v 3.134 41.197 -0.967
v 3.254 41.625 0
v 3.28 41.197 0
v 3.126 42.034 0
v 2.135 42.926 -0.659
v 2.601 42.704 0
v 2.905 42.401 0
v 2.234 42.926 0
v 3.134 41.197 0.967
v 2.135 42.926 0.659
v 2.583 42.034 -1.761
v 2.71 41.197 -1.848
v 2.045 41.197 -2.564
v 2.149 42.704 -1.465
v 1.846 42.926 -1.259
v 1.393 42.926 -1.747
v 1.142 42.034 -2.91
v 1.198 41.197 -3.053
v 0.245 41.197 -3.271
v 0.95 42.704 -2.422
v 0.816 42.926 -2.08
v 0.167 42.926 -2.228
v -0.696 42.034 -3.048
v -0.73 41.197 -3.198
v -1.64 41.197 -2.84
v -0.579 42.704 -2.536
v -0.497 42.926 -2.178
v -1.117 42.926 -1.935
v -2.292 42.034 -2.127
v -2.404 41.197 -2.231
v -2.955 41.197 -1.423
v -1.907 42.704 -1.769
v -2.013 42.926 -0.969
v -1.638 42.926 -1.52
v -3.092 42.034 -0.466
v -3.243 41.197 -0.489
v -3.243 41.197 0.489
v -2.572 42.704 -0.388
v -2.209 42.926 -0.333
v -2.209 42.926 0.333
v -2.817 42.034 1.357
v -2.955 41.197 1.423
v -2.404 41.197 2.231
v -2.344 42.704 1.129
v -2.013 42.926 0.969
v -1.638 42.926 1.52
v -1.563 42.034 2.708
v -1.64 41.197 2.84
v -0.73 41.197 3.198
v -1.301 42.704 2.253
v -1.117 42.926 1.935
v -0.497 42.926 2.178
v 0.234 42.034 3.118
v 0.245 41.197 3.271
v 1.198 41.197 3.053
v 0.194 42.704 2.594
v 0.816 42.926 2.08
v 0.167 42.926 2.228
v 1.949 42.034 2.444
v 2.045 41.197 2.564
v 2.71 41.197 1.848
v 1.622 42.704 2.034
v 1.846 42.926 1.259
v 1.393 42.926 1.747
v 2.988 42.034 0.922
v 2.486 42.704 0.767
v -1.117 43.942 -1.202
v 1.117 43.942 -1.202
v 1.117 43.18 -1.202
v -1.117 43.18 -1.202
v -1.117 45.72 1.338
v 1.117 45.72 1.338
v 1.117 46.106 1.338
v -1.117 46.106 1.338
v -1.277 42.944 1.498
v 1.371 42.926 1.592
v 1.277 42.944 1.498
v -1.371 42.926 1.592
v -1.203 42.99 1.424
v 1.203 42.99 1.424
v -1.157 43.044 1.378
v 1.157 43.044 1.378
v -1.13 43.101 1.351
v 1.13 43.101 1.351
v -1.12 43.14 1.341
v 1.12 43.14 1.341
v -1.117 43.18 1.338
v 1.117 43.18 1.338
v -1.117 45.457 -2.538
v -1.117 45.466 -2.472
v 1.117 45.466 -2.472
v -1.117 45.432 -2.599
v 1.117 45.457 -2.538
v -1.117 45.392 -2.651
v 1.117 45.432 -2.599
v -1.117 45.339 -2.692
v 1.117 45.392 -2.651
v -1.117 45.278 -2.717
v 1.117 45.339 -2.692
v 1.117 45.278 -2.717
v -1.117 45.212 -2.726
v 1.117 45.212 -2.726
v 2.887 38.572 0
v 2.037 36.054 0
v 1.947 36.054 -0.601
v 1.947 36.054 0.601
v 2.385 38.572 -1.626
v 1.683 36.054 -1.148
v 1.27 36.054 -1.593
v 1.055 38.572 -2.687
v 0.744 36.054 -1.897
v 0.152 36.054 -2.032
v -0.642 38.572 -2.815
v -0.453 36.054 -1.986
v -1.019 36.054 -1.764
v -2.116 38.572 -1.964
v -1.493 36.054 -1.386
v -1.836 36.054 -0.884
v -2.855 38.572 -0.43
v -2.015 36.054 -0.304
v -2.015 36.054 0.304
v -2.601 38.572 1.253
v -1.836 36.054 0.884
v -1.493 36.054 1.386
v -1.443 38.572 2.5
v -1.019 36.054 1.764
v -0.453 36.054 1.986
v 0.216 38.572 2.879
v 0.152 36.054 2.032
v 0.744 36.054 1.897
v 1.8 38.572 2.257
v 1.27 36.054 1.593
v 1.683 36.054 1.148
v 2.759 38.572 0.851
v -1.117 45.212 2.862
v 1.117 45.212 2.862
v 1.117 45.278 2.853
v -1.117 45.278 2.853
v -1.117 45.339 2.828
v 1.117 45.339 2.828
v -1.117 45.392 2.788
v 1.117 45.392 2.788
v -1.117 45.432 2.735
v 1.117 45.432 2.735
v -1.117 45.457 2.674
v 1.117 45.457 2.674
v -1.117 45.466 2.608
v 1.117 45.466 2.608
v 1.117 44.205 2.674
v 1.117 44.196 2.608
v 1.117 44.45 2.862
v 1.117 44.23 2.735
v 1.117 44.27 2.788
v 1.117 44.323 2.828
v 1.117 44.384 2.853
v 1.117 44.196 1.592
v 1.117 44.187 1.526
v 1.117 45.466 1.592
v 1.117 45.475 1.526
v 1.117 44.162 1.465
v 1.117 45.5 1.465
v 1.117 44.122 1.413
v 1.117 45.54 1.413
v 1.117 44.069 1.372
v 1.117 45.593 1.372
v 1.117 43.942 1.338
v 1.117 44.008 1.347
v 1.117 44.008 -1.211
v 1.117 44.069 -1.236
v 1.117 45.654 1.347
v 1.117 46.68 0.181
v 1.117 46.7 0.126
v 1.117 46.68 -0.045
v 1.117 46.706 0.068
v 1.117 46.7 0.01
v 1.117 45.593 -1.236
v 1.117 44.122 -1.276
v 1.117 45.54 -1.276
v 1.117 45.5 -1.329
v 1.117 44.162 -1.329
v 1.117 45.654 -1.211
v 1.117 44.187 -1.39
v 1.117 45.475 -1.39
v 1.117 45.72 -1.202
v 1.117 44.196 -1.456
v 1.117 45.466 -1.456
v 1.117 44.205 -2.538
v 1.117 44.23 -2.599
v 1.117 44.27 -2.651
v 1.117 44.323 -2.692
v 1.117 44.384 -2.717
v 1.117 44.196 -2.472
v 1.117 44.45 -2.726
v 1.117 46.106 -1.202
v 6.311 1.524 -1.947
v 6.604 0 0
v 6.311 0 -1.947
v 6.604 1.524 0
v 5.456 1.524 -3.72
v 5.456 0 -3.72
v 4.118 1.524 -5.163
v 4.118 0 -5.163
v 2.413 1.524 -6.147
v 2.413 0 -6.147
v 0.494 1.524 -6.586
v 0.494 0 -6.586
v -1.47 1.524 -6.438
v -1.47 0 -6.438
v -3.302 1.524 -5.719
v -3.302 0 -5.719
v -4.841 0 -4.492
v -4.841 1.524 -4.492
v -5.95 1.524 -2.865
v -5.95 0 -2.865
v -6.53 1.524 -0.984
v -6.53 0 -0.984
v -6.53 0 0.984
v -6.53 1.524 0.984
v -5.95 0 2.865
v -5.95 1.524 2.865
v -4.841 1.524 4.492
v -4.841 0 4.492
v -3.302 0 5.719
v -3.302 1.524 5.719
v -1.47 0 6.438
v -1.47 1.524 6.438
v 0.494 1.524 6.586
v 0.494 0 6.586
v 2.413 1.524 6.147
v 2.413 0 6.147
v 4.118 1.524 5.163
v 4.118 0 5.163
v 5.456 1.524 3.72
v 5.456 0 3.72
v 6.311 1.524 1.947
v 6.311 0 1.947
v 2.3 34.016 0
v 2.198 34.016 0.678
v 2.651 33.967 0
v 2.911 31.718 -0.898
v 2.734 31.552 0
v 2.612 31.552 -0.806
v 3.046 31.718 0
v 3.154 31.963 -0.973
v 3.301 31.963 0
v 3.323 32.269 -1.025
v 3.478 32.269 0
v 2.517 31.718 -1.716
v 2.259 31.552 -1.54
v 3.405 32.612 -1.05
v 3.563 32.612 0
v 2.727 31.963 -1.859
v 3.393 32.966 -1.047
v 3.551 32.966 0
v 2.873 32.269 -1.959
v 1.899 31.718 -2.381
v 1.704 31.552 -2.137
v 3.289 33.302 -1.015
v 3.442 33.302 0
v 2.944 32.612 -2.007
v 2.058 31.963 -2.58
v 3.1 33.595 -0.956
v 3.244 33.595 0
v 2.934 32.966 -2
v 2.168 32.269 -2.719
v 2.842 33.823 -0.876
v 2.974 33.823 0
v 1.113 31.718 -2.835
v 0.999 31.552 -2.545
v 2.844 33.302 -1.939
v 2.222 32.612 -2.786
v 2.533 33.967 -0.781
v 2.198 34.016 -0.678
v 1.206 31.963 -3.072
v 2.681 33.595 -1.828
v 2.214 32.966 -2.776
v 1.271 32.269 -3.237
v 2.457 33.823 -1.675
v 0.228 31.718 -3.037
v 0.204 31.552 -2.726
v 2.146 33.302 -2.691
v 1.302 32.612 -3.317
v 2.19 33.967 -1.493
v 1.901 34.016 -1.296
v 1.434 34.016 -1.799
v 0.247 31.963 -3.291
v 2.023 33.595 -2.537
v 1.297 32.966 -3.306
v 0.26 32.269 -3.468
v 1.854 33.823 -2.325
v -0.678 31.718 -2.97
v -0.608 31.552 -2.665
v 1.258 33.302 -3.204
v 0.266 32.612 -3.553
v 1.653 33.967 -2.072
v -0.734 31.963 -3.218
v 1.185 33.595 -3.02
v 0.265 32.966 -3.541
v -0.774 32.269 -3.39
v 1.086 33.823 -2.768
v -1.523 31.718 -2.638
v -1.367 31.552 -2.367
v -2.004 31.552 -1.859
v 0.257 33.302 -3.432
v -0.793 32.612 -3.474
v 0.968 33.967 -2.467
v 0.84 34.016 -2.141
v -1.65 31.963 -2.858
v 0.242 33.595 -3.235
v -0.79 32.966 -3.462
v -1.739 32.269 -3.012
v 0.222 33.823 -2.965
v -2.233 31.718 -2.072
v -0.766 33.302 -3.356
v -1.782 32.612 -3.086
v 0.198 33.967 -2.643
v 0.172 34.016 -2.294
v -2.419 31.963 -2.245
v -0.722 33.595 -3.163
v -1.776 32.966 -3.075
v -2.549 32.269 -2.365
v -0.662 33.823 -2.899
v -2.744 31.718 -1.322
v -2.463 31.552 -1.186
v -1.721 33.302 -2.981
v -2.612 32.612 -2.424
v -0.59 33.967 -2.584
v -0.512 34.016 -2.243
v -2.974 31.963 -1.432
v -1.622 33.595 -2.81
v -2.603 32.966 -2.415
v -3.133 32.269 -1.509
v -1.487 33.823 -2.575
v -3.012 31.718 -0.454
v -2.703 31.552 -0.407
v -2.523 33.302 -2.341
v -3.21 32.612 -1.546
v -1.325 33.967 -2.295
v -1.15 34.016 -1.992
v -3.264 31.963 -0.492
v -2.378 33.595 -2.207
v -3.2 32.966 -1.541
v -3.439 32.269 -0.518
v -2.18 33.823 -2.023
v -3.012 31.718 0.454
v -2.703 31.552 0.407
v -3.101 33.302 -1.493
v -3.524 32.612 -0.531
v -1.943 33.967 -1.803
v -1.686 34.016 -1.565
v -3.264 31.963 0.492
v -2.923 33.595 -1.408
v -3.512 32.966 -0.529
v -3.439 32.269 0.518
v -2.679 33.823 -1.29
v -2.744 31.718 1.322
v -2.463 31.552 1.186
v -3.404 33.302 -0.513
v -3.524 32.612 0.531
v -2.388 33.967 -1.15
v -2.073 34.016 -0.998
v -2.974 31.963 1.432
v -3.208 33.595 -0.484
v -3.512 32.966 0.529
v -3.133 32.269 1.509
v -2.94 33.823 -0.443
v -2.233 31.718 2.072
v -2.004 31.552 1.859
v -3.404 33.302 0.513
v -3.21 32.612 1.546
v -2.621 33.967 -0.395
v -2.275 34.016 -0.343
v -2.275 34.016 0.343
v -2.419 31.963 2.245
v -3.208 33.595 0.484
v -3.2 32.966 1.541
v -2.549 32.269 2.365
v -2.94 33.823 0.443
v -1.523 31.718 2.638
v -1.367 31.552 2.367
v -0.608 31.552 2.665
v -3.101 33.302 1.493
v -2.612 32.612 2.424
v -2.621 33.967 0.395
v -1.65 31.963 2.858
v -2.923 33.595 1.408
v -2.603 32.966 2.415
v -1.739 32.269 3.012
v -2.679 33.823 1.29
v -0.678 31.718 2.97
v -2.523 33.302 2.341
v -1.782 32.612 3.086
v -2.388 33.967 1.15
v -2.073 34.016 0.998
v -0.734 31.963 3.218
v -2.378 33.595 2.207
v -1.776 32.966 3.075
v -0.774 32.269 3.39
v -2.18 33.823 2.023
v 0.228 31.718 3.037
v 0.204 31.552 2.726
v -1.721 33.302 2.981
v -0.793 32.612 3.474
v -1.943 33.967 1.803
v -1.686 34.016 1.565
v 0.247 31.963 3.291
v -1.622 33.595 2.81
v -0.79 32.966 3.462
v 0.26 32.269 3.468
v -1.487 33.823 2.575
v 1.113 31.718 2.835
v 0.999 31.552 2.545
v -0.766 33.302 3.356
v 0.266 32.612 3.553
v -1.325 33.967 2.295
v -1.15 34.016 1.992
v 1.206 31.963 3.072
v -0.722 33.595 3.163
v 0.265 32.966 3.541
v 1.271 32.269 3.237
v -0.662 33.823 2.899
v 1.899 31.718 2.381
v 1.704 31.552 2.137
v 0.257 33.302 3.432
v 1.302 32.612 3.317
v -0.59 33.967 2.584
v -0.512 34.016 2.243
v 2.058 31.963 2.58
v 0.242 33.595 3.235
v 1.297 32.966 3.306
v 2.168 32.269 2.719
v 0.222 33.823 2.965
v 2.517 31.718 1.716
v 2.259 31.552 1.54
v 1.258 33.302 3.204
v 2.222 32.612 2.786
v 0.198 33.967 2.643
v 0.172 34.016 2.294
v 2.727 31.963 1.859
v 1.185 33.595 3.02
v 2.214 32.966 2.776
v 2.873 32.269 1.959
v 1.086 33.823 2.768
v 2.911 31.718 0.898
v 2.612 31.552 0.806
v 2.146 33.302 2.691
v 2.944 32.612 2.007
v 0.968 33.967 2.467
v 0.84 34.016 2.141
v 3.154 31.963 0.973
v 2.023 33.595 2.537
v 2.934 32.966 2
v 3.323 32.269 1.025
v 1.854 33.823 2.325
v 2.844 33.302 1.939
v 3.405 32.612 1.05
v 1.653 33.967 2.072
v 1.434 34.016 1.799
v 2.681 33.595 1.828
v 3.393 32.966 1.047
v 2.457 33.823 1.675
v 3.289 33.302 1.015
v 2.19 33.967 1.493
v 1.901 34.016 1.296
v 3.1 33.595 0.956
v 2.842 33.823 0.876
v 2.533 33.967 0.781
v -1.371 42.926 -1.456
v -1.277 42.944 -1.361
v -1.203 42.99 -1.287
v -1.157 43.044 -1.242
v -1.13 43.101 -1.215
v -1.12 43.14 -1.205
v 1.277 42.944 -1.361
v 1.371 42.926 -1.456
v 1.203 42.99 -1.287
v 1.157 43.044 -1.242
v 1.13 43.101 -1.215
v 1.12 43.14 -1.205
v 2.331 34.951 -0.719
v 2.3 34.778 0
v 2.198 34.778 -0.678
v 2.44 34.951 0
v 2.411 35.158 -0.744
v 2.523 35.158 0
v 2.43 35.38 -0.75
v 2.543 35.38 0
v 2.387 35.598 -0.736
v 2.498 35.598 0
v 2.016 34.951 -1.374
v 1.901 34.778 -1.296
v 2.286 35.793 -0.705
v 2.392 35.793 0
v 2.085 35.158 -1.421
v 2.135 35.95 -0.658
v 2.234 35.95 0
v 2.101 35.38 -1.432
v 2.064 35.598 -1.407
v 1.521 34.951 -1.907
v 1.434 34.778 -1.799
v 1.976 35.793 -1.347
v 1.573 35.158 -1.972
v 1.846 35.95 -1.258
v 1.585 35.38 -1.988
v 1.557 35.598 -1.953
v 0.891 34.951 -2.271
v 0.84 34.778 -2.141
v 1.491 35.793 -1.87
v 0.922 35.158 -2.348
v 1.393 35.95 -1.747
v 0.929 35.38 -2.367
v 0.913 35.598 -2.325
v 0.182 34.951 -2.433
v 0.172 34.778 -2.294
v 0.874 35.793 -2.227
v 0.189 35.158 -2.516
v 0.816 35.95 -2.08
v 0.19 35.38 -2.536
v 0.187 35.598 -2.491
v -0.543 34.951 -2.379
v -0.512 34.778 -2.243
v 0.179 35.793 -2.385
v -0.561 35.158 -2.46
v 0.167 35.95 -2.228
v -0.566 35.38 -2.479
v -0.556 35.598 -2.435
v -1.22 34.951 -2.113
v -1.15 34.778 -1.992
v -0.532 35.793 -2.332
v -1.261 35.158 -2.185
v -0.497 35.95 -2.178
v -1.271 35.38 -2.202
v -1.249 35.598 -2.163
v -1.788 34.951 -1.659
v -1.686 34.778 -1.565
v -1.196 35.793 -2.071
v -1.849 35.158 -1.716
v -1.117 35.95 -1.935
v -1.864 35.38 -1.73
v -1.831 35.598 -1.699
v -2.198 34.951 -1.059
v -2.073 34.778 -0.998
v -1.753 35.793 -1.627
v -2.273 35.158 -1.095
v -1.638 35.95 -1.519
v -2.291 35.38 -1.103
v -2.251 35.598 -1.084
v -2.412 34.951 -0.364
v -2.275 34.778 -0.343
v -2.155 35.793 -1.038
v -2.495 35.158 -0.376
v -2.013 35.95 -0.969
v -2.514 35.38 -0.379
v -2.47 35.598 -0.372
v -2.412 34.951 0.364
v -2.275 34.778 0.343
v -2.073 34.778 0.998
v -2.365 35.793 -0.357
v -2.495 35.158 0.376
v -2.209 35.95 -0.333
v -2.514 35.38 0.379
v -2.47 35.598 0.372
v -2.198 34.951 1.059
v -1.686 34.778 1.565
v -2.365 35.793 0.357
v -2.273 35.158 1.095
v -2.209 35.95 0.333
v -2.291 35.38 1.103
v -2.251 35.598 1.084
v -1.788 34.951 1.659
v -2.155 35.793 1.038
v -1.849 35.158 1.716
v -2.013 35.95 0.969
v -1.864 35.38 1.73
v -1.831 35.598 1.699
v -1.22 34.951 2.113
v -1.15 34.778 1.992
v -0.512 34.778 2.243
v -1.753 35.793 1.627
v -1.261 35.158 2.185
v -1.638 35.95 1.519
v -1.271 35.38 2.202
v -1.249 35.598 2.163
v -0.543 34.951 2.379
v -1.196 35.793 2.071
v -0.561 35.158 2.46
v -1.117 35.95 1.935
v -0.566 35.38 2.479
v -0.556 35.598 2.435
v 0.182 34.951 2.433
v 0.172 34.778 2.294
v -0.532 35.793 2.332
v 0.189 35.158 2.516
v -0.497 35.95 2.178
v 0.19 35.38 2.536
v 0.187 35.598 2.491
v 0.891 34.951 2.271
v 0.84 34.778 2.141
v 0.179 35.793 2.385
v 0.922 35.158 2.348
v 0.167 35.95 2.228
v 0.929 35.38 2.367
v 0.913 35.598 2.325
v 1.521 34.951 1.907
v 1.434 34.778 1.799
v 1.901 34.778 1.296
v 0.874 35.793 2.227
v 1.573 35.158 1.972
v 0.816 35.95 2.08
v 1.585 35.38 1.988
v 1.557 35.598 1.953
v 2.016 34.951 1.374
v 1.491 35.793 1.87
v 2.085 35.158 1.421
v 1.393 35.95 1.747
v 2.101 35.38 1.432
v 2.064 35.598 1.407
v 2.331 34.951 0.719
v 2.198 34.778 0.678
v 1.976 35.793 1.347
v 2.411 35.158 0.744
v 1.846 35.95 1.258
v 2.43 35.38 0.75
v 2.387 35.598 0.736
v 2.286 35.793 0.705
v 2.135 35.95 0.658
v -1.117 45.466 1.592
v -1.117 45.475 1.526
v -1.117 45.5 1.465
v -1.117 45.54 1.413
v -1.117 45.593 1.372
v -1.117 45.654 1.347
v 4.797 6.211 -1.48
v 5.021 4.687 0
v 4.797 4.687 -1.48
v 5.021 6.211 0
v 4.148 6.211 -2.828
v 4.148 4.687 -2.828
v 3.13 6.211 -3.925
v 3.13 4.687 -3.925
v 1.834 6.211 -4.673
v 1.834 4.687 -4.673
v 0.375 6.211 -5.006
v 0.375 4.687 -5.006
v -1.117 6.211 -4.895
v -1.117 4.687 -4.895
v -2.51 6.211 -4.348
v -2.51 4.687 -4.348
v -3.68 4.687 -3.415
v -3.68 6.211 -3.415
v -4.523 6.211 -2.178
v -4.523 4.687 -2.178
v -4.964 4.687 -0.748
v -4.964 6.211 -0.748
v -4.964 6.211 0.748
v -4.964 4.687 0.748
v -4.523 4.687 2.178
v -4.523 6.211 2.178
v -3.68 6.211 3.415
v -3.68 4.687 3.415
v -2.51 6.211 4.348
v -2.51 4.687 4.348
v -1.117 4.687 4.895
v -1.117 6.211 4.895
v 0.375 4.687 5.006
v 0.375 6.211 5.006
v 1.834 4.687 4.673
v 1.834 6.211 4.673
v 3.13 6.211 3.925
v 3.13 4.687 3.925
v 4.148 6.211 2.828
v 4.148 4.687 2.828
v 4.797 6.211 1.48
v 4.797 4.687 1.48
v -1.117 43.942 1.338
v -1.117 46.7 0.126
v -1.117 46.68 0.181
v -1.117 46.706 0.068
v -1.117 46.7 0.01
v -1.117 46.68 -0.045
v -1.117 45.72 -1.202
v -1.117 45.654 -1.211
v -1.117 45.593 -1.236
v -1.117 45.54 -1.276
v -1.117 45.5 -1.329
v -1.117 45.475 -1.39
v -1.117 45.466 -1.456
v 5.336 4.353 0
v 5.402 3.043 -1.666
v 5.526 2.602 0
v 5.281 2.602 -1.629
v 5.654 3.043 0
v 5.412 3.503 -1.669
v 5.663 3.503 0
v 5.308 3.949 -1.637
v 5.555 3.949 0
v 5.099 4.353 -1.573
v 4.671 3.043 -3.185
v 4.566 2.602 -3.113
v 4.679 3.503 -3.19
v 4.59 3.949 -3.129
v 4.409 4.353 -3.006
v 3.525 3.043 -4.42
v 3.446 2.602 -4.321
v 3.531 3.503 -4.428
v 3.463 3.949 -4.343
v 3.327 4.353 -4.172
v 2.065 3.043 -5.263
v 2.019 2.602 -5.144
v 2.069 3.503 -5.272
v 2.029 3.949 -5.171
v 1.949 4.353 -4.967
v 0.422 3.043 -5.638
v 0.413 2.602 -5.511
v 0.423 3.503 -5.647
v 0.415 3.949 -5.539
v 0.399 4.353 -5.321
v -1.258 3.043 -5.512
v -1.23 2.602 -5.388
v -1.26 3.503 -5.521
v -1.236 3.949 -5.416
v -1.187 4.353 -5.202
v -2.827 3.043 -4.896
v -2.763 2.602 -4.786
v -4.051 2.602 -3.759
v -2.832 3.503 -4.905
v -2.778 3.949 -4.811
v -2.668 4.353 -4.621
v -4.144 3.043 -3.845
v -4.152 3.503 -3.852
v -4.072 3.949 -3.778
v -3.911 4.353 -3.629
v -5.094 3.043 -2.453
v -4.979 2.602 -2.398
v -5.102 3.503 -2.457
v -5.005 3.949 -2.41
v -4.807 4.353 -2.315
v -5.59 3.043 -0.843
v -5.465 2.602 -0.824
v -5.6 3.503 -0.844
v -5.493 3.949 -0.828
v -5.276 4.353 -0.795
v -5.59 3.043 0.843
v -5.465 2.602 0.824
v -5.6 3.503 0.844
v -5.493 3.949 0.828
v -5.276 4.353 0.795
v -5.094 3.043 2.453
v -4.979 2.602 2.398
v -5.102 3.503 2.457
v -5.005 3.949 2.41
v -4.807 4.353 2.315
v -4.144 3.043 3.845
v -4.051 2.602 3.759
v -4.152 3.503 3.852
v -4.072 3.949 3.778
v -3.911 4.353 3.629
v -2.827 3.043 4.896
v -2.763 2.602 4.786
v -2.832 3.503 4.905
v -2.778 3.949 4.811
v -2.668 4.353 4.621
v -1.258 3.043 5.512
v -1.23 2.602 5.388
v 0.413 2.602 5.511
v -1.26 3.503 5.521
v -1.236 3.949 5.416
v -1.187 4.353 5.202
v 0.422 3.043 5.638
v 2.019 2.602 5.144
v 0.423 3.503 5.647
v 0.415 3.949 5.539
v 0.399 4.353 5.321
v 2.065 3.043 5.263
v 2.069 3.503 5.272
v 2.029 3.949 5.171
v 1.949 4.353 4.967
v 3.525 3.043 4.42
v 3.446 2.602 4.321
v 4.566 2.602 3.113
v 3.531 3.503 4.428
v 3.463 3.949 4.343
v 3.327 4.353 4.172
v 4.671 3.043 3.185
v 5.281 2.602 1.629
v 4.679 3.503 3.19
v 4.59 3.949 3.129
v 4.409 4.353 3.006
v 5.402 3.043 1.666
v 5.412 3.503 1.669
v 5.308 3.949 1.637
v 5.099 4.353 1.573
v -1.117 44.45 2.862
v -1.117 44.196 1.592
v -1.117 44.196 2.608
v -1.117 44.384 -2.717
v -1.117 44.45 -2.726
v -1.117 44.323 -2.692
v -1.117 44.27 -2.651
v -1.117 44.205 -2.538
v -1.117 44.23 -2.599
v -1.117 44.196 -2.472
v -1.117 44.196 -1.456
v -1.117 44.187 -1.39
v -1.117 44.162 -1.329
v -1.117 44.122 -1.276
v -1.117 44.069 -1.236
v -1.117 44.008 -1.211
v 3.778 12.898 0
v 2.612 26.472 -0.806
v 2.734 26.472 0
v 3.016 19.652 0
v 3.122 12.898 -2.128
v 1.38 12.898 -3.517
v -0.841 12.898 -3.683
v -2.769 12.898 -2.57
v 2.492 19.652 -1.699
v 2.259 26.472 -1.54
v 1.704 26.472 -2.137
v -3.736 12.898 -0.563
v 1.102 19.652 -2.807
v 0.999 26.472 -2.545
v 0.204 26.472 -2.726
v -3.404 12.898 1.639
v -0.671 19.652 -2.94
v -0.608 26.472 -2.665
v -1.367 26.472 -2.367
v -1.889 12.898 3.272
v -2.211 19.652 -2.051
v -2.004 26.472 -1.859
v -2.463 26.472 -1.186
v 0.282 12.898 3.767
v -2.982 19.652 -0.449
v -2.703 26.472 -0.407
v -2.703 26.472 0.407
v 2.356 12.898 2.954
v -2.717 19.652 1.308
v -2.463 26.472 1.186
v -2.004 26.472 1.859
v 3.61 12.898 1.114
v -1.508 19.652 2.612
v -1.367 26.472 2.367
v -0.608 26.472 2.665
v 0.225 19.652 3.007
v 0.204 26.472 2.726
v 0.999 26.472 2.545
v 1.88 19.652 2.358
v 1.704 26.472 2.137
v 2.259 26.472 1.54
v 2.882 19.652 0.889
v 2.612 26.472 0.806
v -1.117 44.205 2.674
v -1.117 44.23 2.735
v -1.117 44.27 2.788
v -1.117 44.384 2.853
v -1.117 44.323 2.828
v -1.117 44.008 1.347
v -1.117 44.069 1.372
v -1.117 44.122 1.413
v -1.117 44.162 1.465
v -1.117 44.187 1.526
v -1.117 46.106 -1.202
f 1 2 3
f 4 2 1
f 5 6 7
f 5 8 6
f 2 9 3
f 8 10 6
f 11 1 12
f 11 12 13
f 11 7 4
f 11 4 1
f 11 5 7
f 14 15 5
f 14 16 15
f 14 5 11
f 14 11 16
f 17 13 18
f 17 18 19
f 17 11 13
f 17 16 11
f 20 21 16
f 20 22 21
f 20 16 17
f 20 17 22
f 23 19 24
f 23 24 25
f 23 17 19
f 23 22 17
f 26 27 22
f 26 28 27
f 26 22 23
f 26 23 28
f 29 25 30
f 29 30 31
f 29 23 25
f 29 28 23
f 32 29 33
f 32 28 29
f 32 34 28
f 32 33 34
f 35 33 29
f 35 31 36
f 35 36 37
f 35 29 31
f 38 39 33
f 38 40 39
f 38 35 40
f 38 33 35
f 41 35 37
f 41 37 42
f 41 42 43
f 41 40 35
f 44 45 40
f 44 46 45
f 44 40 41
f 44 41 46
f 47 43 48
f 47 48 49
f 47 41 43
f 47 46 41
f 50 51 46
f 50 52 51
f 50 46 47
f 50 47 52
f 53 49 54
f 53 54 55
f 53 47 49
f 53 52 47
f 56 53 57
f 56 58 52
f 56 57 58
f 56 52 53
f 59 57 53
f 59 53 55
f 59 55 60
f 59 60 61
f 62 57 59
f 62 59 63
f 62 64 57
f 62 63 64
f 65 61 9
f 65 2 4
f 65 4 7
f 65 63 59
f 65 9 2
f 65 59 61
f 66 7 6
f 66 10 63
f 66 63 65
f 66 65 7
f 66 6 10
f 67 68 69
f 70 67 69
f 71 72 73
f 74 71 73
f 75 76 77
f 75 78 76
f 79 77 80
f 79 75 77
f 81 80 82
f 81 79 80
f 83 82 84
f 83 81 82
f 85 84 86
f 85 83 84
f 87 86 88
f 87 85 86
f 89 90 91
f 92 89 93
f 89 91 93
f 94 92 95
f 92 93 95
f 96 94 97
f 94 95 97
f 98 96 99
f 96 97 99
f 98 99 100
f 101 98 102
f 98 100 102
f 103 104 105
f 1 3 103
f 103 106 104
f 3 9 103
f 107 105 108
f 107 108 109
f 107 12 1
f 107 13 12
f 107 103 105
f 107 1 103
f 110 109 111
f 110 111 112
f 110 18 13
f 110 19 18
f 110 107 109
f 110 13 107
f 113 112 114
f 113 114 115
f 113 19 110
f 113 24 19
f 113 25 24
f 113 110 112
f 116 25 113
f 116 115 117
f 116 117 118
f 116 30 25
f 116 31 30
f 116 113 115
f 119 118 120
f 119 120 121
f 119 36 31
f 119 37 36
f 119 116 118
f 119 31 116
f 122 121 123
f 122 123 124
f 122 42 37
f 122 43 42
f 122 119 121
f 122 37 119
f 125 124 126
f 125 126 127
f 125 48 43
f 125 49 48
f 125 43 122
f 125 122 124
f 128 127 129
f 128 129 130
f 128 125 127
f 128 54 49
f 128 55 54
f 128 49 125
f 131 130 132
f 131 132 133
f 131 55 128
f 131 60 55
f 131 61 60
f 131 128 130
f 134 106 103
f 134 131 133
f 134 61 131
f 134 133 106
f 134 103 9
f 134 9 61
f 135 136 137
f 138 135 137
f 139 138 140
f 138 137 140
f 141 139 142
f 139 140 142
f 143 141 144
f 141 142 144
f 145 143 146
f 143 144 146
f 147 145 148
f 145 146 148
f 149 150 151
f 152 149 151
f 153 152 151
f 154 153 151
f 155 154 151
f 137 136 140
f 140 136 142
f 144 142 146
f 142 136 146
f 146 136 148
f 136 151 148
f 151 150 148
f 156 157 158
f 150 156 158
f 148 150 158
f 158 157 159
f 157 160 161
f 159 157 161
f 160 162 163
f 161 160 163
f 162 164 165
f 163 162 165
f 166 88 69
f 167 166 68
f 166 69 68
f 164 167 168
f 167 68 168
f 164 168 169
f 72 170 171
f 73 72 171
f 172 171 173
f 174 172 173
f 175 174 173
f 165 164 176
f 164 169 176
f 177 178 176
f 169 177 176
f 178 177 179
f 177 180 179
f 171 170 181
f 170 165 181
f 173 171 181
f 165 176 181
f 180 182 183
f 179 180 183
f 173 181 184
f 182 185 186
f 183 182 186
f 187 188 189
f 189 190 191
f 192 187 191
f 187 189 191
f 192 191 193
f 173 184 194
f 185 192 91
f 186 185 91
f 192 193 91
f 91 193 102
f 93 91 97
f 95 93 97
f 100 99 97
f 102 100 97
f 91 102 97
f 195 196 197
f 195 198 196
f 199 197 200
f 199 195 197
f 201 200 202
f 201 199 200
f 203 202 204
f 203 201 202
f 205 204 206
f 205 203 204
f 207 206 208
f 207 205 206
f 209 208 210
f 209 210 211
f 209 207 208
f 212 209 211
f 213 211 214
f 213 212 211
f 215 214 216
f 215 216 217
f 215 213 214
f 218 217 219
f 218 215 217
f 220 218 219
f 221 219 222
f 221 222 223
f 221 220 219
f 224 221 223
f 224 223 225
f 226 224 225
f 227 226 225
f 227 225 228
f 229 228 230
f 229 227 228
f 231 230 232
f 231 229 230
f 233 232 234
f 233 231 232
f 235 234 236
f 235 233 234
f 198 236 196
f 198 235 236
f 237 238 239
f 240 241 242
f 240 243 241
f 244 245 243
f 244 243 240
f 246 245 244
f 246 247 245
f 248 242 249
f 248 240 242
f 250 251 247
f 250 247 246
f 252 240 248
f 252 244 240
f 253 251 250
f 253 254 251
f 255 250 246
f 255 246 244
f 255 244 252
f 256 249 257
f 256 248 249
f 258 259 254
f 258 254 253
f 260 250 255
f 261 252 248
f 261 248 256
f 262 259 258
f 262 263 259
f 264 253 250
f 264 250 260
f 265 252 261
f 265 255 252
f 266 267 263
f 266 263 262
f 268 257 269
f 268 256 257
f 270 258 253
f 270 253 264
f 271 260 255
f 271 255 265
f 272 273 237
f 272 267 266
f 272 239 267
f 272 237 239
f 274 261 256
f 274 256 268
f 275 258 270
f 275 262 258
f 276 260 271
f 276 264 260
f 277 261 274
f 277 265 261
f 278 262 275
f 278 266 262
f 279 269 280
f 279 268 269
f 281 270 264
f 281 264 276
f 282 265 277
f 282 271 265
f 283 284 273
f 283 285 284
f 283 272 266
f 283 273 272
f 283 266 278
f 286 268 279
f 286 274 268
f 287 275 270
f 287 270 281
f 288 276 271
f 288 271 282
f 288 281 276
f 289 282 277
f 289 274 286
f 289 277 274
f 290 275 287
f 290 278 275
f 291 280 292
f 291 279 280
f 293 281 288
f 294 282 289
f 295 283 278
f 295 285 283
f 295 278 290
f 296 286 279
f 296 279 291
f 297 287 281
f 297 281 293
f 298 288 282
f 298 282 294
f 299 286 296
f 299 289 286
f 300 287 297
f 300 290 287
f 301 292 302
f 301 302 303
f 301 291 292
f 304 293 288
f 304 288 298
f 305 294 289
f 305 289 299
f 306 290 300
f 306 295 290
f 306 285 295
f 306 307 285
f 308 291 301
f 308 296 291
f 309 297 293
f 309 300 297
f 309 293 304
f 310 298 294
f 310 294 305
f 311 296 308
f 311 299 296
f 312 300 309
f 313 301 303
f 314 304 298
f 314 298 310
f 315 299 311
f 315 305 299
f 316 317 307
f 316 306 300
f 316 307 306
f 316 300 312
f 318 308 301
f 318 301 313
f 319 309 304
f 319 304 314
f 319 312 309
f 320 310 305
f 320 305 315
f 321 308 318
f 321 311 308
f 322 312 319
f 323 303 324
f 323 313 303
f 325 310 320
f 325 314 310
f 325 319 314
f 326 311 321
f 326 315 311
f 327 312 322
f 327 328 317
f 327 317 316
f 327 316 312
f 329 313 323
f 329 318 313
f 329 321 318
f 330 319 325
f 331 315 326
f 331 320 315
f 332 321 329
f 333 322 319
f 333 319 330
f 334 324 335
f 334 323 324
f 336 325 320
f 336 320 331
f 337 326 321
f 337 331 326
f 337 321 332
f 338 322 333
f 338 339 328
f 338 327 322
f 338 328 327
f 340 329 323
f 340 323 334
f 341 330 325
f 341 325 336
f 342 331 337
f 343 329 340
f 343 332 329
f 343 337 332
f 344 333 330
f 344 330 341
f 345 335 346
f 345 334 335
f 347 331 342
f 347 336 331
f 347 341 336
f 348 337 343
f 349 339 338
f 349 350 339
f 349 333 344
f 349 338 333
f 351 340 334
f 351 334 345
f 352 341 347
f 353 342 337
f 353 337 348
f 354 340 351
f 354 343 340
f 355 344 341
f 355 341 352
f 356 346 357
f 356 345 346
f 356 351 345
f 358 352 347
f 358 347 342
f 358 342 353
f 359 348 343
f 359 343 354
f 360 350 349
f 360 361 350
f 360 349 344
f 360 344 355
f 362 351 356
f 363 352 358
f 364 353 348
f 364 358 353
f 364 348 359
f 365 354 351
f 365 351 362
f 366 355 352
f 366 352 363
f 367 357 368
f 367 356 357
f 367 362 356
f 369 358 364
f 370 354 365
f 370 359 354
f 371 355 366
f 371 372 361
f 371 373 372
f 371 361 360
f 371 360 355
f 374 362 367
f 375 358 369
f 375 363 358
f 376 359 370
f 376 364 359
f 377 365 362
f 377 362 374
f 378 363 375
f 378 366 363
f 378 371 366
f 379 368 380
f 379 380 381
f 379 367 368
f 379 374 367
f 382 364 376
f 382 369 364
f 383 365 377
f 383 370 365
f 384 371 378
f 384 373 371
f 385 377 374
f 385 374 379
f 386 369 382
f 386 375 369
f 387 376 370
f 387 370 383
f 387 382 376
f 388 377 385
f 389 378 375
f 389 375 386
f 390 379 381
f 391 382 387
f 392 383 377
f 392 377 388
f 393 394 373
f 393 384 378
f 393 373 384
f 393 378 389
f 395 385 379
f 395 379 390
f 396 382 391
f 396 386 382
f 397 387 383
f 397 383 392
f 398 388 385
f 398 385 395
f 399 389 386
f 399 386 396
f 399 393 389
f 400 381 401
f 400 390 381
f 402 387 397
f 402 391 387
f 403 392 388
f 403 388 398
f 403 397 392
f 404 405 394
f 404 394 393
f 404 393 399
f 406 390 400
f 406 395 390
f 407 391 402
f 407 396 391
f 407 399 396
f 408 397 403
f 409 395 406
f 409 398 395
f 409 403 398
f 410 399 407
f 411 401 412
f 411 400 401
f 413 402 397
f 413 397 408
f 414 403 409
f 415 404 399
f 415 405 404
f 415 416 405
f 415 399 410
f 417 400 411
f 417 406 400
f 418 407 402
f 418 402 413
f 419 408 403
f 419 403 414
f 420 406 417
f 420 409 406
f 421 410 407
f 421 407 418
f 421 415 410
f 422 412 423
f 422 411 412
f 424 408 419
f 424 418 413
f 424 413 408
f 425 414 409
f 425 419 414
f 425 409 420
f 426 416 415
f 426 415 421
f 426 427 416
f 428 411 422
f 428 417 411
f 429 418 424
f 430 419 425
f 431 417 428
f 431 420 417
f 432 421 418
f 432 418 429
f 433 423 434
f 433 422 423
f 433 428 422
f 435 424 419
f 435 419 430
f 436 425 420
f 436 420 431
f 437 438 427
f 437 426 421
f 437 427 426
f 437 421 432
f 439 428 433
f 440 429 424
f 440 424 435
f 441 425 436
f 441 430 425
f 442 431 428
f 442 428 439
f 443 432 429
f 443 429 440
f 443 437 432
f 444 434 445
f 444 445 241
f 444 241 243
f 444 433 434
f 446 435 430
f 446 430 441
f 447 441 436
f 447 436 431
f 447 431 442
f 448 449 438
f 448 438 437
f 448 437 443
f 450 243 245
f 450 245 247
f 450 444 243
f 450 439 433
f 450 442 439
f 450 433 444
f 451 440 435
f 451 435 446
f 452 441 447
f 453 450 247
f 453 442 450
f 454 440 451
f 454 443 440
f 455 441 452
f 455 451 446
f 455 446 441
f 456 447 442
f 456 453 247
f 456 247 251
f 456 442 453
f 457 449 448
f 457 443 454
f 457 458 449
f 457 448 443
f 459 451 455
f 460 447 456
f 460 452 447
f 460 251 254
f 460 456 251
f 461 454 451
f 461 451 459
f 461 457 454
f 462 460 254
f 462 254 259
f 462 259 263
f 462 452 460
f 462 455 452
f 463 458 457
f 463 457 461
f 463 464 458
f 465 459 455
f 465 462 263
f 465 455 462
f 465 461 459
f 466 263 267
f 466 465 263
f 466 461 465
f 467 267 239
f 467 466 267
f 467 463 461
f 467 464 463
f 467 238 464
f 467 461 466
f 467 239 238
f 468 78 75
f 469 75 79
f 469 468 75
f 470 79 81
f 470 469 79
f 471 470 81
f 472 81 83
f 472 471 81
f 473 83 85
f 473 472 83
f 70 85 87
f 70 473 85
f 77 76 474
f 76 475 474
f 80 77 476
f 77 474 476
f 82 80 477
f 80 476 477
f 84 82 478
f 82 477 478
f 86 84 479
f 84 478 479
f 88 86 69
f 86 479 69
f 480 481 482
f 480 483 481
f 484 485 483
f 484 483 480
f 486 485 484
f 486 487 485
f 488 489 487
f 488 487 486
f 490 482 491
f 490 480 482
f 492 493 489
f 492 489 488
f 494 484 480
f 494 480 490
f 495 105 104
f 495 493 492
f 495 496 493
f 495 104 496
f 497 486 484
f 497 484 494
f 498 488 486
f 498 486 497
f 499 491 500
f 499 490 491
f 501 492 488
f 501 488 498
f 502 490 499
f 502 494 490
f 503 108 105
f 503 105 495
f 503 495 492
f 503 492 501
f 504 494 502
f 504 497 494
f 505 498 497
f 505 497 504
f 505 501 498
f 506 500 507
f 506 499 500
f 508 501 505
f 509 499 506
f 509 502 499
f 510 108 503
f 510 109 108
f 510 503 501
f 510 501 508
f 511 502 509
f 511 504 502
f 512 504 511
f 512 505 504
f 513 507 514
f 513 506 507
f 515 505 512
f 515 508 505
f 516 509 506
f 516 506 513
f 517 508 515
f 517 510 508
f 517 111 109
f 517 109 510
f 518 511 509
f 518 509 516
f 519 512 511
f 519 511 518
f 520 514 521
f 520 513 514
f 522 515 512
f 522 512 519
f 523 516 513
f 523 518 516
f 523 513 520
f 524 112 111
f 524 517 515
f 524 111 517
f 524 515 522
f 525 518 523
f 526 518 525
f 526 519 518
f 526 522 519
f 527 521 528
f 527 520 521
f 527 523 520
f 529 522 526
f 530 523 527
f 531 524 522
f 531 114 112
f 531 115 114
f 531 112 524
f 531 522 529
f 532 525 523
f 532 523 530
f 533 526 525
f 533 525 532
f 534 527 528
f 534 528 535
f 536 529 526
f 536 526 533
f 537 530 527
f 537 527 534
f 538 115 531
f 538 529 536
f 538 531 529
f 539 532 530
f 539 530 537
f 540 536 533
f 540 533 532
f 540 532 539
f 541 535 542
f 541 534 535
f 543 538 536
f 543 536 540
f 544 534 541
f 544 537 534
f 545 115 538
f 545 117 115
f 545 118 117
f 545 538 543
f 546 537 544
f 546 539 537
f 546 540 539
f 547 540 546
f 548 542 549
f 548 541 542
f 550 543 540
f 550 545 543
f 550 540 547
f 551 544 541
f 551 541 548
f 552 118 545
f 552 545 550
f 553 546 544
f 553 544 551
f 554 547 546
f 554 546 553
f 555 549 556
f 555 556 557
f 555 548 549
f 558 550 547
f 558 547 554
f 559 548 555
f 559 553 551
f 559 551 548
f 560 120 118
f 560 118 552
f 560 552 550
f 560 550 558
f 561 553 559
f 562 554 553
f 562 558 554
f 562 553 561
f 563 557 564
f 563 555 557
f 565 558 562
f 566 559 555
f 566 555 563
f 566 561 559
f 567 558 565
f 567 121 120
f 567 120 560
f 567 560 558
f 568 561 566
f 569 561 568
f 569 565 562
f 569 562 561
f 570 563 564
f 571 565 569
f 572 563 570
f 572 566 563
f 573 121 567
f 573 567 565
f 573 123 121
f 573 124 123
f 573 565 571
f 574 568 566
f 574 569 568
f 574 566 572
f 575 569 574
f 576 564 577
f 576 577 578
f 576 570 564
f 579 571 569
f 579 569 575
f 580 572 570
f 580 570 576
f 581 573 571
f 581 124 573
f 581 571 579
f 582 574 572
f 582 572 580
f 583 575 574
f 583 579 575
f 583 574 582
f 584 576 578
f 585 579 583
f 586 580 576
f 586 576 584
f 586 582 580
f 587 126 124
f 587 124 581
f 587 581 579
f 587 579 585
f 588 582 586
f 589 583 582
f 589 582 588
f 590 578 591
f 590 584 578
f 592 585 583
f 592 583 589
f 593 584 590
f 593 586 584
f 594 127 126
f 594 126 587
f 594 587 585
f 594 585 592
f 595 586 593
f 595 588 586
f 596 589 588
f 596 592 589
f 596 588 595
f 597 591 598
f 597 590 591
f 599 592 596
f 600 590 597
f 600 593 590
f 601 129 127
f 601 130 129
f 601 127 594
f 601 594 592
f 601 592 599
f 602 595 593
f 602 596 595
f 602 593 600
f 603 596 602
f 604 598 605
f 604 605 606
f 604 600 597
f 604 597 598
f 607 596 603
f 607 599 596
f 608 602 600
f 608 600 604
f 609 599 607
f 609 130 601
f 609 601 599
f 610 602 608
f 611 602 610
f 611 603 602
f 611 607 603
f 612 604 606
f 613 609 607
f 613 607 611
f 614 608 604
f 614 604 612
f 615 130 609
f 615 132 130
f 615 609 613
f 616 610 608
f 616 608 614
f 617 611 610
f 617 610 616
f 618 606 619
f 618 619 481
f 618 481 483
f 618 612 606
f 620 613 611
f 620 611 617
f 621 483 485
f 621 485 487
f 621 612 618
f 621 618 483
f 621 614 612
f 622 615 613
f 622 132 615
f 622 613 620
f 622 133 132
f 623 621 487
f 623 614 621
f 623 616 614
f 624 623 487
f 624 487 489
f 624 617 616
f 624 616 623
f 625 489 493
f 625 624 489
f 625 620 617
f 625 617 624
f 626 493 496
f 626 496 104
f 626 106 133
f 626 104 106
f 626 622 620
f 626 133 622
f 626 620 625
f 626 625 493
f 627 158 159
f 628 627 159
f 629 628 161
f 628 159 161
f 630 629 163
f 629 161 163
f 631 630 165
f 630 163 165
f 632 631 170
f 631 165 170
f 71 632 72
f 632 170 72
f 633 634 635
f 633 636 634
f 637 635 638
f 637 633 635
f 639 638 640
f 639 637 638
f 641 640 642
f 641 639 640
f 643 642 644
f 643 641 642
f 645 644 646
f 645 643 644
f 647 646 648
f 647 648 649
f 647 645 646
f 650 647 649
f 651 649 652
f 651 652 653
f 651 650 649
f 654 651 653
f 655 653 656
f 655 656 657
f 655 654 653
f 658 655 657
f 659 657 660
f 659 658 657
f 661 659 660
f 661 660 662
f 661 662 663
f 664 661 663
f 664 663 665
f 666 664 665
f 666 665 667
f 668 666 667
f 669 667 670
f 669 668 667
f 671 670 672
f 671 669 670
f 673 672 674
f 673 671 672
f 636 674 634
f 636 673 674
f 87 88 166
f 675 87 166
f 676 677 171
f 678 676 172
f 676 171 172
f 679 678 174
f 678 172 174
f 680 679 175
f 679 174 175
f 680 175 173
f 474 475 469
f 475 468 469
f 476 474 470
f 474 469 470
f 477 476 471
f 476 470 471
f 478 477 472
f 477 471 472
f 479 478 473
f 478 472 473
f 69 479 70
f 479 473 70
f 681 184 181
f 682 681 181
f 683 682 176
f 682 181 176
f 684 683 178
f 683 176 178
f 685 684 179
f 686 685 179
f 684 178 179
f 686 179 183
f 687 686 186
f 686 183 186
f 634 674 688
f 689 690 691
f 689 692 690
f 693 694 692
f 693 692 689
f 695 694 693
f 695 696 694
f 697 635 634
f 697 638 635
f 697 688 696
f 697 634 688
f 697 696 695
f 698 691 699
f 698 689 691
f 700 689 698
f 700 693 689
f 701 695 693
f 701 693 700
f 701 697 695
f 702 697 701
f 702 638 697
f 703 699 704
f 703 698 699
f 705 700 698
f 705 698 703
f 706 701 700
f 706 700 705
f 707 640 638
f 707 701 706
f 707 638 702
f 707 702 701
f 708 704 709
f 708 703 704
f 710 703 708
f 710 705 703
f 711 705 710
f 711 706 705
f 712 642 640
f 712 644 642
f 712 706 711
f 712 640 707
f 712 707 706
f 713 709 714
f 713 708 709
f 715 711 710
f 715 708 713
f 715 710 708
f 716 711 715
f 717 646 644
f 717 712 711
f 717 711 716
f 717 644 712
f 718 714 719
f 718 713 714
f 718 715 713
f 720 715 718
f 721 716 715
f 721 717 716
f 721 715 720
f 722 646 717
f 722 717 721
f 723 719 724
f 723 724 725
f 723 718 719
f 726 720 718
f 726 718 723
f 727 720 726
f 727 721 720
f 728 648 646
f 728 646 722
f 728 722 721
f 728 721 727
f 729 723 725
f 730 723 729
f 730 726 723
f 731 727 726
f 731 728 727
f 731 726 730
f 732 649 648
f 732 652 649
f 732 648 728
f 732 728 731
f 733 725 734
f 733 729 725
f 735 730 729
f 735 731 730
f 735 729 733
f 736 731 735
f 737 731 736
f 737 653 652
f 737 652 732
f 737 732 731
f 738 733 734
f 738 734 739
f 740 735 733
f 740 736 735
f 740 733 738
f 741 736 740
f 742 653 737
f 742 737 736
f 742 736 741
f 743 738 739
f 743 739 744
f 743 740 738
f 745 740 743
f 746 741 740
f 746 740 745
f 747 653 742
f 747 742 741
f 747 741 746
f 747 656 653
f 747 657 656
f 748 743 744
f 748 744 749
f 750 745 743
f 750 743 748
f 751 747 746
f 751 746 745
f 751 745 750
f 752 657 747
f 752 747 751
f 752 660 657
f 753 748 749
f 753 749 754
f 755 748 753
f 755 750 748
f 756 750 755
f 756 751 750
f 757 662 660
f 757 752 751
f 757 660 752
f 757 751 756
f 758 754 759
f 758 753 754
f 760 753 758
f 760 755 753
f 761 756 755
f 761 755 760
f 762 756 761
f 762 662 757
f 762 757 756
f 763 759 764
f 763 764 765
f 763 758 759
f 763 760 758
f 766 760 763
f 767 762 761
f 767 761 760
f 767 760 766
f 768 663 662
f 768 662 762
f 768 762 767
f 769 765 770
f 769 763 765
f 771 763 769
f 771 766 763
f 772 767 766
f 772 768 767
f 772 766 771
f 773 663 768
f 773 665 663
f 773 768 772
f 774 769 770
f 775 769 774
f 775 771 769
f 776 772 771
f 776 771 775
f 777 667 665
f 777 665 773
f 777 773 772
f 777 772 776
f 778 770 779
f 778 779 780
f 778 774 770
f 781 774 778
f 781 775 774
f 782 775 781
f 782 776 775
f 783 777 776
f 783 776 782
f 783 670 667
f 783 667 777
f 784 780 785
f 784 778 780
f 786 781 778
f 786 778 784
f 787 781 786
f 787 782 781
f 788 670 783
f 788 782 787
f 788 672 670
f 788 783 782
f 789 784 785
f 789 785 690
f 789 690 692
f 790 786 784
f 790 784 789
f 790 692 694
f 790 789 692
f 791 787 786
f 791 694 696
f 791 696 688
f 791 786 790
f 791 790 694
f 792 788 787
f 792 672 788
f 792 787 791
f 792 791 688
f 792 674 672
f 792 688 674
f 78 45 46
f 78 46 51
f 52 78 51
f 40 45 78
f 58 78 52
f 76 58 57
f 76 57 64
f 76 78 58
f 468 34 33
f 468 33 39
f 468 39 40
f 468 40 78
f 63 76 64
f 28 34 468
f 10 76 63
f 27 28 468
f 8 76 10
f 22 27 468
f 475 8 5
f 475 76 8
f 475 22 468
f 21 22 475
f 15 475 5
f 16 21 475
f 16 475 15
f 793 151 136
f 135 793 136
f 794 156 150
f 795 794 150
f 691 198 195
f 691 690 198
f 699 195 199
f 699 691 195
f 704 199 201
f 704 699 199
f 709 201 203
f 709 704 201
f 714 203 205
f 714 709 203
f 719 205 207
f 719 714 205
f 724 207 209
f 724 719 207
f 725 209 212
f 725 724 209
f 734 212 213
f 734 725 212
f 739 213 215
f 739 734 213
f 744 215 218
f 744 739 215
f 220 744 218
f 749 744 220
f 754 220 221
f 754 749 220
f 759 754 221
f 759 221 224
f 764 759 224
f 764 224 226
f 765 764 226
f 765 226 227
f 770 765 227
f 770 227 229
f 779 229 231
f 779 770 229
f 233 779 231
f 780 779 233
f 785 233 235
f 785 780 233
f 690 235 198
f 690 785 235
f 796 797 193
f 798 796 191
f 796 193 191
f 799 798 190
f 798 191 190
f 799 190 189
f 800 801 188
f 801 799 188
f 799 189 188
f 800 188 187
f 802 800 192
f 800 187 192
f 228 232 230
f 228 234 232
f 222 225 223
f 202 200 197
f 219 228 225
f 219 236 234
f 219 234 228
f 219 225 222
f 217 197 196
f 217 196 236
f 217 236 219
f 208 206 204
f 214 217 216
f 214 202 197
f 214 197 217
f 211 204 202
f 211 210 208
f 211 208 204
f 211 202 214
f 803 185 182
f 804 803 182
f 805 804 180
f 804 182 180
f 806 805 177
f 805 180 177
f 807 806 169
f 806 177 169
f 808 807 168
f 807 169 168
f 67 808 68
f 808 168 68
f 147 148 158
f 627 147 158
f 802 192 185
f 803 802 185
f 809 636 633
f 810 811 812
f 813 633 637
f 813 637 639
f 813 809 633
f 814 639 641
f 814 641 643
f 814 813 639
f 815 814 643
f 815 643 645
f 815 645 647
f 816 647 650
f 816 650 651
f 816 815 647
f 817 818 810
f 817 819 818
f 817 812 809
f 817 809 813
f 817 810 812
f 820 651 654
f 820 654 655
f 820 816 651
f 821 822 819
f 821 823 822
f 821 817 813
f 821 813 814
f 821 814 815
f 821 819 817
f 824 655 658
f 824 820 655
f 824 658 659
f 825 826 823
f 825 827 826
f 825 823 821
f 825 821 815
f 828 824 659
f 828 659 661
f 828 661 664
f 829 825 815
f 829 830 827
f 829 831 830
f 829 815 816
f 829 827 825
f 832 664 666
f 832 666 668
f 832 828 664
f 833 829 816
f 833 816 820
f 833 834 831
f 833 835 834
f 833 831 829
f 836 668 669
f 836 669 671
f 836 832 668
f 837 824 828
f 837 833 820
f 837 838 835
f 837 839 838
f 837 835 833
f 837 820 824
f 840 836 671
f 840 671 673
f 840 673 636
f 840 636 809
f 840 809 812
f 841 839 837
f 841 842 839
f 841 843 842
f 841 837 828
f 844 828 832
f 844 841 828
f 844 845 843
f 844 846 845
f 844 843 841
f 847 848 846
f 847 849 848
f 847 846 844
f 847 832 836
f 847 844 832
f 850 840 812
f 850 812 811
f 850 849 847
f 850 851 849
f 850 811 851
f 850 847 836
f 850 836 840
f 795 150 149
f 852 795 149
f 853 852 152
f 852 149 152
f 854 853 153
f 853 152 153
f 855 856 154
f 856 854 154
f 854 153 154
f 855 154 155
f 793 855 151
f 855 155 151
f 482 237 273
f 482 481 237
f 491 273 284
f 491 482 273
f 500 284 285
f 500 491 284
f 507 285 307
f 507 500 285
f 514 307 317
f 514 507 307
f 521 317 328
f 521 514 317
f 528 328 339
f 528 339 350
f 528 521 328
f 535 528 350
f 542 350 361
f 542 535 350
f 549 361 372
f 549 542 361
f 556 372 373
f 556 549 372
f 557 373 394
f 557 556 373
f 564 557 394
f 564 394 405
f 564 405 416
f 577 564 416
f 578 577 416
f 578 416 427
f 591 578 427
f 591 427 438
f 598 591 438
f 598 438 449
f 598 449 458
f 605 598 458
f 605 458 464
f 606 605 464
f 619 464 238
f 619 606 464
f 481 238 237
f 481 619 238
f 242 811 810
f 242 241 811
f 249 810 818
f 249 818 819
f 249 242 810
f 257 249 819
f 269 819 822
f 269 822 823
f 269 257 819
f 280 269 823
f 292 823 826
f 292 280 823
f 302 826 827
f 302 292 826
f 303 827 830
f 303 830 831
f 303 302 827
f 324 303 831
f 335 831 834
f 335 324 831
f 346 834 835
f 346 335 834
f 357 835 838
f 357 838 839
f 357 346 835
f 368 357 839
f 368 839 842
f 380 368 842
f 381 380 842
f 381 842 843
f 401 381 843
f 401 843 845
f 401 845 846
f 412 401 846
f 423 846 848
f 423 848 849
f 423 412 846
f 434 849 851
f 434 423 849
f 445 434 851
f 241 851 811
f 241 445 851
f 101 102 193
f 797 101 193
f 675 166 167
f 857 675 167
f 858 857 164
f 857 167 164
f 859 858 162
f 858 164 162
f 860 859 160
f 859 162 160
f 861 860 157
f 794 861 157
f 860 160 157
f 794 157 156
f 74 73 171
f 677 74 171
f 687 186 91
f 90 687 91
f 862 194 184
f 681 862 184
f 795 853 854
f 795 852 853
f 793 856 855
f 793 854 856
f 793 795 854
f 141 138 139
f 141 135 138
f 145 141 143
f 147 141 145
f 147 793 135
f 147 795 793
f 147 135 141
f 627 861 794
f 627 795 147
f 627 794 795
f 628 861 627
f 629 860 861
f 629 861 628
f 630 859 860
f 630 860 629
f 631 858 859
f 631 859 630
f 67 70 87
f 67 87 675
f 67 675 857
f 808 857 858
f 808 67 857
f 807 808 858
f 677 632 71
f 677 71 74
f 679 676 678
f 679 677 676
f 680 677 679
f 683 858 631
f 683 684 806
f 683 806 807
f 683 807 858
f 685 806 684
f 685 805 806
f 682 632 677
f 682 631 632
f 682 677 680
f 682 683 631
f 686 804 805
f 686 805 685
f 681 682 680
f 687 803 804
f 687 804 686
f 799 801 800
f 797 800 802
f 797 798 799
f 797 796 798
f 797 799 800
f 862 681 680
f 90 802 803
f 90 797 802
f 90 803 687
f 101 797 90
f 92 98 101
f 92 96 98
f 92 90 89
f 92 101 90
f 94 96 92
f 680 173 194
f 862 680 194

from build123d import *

# Parameters (mm, degrees)
SKETCH3_W           = 2.234278516
SKETCH3_H           = 3.869883908
BOSS_EXTRUDE1_DEPTH = 3.81
SKETCH4_W           = 2.234278516
SKETCH4_H           = 3.81
BOSS_EXTRUDE2_DEPTH = 1.27
SKETCH7_W           = 2.234278516
SKETCH7_H           = 3.81
BOSS_EXTRUDE3_DEPTH = 1.27
CUT_EXTRUDE3_DEPTH  = 2.286
FILLET1_R           = 0.254


with BuildPart() as part:
    # Sketch1 → Revolve1 (revolve)
    with BuildSketch(Plane.XY):
        with BuildLine():
            Line((0, 0), (6.604, 0))
            Line((6.604, 0), (6.604, 1.524))
            Line((6.604, 1.524), (5.526369265, 2.601630735))
            ThreePointArc((5.526369265, 2.601630735), (5.623645794, 3.729450681), (5.02050731, 4.687398762))
            Line((5.02050731, 4.687398762), (5.02050731, 6.211398762))
            add(Edge.make_bspline(
                [(5.02050731, 6.211398762), (2.796634976, 16.191993282), (2.733543957, 26.472012216)],
                knots=[0, 0, 0, 1, 1, 1], degree=2))
            Line((2.733543957, 26.472012216), (2.733543957, 31.552012216))
            ThreePointArc((2.733543957, 31.552012216), (3.551212648, 32.965759778), (2.300394609, 34.015863816))
            Line((2.300394609, 34.015863816), (2.300394609, 34.777863816))
            ThreePointArc((2.300394609, 34.777863816), (2.528411489, 35.490223347), (2.037352116, 36.054411694))
            add(Edge.make_bspline(
                [(2.037352116, 36.054411694), (2.754588802, 37.690610821), (3.171523279, 39.41712427), (3.279734912, 41.196512193)],
                knots=[0, 0, 0, 0, 0.825528863, 0.825528863, 0.825528863, 0.825528863], degree=3))
            ThreePointArc((3.279734912, 41.196512193), (3.026614336, 42.224230944), (2.234278516, 42.926))
            Line((2.234278516, 42.926), (0, 42.926))
            Line((0, 42.926), (0, 0))
        make_face()
    revolve(axis=Axis((0, 0, 0), (0, 1, 0)))

    # Sketch3 → Boss-Extrude1 (add)
    with BuildSketch(Plane(origin=(0, 42.926, 0), x_dir=(1, 0, 0), z_dir=(0, 1, 0))):
        Rectangle(SKETCH3_W, SKETCH3_H)
    extrude(amount=BOSS_EXTRUDE1_DEPTH)

    # Sketch4 → Boss-Extrude2 (add)
    with BuildSketch(Plane(origin=(0, 0, -1.934941954), x_dir=(-1, 0, 0), z_dir=(0, 0, -1))):
        with Locations((0, 44.831)):
            Rectangle(SKETCH4_W, SKETCH4_H)
    extrude(amount=BOSS_EXTRUDE2_DEPTH)

    # Sketch7 → Boss-Extrude3 (add)
    with BuildSketch(Plane.XY.offset(1.934941954)):
        with Locations((0, 44.831)):
            Rectangle(SKETCH7_W, SKETCH7_H)
    extrude(amount=BOSS_EXTRUDE3_DEPTH)

    # Sketch11 → Cut-Extrude3 (cut)
    with BuildSketch(Plane(origin=(1.117139258, 0, 0), x_dir=(0, 0, -1), z_dir=(1, 0, 0))):
        with BuildLine():
            Line((-1.934941954, 42.926), (-1.33813329, 42.926))
            Line((-1.33813329, 42.926), (-1.33813329, 43.942))
            ThreePointArc((-1.33813329, 43.942), (-1.412528167, 44.121605122), (-1.59213329, 44.196))
            Line((-1.59213329, 44.196), (-2.60813329, 44.196))
            ThreePointArc((-2.60813329, 44.196), (-2.787738412, 44.270394878), (-2.86213329, 44.45))
            Line((-2.86213329, 44.45), (-2.86213329, 45.212))
            ThreePointArc((-2.86213329, 45.212), (-2.787738412, 45.391605122), (-2.60813329, 45.466))
            Line((-2.60813329, 45.466), (-1.59213329, 45.466))
            ThreePointArc((-1.59213329, 45.466), (-1.412528167, 45.540394878), (-1.33813329, 45.72))
            Line((-1.33813329, 45.72), (-1.33813329, 46.10618983))
            Line((-1.33813329, 46.10618983), (-0.180981014, 46.680037288))
            ThreePointArc((-0.180981014, 46.680037288), (-0.06813329, 46.706482039), (0.044714435, 46.680037288))
            Line((0.044714435, 46.680037288), (1.20186671, 46.10618983))
            Line((1.20186671, 46.10618983), (1.20186671, 45.72))
            ThreePointArc((1.20186671, 45.72), (1.276261588, 45.540394878), (1.45586671, 45.466))
            Line((1.45586671, 45.466), (2.47186671, 45.466))
            ThreePointArc((2.47186671, 45.466), (2.651471833, 45.391605122), (2.72586671, 45.212))
            Line((2.72586671, 45.212), (2.72586671, 44.45))
            ThreePointArc((2.72586671, 44.45), (2.651471833, 44.270394878), (2.47186671, 44.196))
            Line((2.47186671, 44.196), (1.45586671, 44.196))
            ThreePointArc((1.45586671, 44.196), (1.276261588, 44.121605122), (1.20186671, 43.942))
            Line((1.20186671, 43.942), (1.20186671, 42.926))
            Line((1.20186671, 42.926), (1.934941954, 42.926))
            Line((1.934941954, 42.926), (3.204941954, 42.926))
            Line((3.204941954, 42.926), (3.204941954, 46.736))
            Line((3.204941954, 46.736), (-3.204941954, 46.736))
            Line((-3.204941954, 46.736), (-3.204941954, 42.926))
            Line((-3.204941954, 42.926), (-1.934941954, 42.926))
        make_face()
    extrude(amount=-CUT_EXTRUDE3_DEPTH, mode=Mode.SUBTRACT)

    # Fillet1
    fillet1_edges = [part.edges().sort_by_distance(p)[0] for p in [
        (0, 42.926, 1.33813329),
        (-1.117139258, 42.926, 0.06813329),
        (1.117139258, 42.926, 0.06813329),
        (0, 42.926, -1.20186671),
    ]]
    fillet(fillet1_edges, radius=FILLET1_R)


solid = part.part
